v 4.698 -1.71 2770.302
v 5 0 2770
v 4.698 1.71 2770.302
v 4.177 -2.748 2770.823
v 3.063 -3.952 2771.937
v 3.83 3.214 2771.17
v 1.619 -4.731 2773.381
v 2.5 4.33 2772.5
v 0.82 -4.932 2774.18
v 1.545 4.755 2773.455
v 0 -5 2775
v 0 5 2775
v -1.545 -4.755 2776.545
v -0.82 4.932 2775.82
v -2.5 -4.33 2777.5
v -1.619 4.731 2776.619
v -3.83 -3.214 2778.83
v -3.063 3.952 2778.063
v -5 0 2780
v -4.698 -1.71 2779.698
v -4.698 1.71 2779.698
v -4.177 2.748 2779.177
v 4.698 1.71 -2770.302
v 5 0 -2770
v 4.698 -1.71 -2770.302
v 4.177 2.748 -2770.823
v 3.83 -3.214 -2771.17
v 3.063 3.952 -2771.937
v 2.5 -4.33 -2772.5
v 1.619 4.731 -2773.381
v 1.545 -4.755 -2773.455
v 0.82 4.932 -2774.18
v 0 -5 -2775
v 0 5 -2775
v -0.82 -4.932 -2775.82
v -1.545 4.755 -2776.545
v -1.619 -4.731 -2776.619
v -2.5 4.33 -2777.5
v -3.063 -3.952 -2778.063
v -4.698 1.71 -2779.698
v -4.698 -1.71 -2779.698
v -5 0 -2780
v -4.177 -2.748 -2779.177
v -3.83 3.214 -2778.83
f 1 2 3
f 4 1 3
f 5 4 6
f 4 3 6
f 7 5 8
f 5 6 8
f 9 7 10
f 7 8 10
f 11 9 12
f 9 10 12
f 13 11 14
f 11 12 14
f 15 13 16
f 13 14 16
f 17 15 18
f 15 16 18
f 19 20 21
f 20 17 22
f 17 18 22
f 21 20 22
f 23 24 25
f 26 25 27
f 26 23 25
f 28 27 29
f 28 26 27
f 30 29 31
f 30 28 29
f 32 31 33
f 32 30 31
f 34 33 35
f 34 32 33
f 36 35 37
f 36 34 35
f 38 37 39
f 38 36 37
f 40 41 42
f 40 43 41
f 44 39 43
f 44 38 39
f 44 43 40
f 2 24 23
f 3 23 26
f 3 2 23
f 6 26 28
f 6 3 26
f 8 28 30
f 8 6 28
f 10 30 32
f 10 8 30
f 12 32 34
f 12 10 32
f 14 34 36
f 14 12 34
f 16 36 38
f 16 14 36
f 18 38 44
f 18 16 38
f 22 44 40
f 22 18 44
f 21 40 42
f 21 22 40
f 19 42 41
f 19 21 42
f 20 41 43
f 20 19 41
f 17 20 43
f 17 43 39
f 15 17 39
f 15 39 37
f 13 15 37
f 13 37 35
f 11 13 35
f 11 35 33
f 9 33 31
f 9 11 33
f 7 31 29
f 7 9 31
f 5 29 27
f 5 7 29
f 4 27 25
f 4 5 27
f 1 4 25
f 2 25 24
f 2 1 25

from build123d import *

# Parameters (mm, degrees)
ESBO_O1_R                = 5
RESSALTO_EXTRUS_O1_DEPTH = 2780
CORTE_EXTRUS_O1_DEPTH    = 5


with BuildPart() as part:
    # Esboço1 → Ressalto-extrusão1 (new, symmetric)
    with BuildSketch(Plane.XY):
        Circle(ESBO_O1_R)
    extrude(amount=RESSALTO_EXTRUS_O1_DEPTH, both=True)

    # Esboço2 → Corte-extrusão1 (cut, symmetric)
    with BuildSketch(Plane(origin=(0, 0, 0), x_dir=(1, 0, 0), z_dir=(0, 1, 0))):
        Polygon((-5, -2780), (5, -2780), (5, -2770), align=None)
    corte_extrus_o1 = extrude(amount=CORTE_EXTRUS_O1_DEPTH, both=True, mode=Mode.SUBTRACT)

    # Espelhar1: Corte-extrusão1 across plane
    add(corte_extrus_o1.mirror(Plane.XY), mode=Mode.SUBTRACT)


solid = part.part
